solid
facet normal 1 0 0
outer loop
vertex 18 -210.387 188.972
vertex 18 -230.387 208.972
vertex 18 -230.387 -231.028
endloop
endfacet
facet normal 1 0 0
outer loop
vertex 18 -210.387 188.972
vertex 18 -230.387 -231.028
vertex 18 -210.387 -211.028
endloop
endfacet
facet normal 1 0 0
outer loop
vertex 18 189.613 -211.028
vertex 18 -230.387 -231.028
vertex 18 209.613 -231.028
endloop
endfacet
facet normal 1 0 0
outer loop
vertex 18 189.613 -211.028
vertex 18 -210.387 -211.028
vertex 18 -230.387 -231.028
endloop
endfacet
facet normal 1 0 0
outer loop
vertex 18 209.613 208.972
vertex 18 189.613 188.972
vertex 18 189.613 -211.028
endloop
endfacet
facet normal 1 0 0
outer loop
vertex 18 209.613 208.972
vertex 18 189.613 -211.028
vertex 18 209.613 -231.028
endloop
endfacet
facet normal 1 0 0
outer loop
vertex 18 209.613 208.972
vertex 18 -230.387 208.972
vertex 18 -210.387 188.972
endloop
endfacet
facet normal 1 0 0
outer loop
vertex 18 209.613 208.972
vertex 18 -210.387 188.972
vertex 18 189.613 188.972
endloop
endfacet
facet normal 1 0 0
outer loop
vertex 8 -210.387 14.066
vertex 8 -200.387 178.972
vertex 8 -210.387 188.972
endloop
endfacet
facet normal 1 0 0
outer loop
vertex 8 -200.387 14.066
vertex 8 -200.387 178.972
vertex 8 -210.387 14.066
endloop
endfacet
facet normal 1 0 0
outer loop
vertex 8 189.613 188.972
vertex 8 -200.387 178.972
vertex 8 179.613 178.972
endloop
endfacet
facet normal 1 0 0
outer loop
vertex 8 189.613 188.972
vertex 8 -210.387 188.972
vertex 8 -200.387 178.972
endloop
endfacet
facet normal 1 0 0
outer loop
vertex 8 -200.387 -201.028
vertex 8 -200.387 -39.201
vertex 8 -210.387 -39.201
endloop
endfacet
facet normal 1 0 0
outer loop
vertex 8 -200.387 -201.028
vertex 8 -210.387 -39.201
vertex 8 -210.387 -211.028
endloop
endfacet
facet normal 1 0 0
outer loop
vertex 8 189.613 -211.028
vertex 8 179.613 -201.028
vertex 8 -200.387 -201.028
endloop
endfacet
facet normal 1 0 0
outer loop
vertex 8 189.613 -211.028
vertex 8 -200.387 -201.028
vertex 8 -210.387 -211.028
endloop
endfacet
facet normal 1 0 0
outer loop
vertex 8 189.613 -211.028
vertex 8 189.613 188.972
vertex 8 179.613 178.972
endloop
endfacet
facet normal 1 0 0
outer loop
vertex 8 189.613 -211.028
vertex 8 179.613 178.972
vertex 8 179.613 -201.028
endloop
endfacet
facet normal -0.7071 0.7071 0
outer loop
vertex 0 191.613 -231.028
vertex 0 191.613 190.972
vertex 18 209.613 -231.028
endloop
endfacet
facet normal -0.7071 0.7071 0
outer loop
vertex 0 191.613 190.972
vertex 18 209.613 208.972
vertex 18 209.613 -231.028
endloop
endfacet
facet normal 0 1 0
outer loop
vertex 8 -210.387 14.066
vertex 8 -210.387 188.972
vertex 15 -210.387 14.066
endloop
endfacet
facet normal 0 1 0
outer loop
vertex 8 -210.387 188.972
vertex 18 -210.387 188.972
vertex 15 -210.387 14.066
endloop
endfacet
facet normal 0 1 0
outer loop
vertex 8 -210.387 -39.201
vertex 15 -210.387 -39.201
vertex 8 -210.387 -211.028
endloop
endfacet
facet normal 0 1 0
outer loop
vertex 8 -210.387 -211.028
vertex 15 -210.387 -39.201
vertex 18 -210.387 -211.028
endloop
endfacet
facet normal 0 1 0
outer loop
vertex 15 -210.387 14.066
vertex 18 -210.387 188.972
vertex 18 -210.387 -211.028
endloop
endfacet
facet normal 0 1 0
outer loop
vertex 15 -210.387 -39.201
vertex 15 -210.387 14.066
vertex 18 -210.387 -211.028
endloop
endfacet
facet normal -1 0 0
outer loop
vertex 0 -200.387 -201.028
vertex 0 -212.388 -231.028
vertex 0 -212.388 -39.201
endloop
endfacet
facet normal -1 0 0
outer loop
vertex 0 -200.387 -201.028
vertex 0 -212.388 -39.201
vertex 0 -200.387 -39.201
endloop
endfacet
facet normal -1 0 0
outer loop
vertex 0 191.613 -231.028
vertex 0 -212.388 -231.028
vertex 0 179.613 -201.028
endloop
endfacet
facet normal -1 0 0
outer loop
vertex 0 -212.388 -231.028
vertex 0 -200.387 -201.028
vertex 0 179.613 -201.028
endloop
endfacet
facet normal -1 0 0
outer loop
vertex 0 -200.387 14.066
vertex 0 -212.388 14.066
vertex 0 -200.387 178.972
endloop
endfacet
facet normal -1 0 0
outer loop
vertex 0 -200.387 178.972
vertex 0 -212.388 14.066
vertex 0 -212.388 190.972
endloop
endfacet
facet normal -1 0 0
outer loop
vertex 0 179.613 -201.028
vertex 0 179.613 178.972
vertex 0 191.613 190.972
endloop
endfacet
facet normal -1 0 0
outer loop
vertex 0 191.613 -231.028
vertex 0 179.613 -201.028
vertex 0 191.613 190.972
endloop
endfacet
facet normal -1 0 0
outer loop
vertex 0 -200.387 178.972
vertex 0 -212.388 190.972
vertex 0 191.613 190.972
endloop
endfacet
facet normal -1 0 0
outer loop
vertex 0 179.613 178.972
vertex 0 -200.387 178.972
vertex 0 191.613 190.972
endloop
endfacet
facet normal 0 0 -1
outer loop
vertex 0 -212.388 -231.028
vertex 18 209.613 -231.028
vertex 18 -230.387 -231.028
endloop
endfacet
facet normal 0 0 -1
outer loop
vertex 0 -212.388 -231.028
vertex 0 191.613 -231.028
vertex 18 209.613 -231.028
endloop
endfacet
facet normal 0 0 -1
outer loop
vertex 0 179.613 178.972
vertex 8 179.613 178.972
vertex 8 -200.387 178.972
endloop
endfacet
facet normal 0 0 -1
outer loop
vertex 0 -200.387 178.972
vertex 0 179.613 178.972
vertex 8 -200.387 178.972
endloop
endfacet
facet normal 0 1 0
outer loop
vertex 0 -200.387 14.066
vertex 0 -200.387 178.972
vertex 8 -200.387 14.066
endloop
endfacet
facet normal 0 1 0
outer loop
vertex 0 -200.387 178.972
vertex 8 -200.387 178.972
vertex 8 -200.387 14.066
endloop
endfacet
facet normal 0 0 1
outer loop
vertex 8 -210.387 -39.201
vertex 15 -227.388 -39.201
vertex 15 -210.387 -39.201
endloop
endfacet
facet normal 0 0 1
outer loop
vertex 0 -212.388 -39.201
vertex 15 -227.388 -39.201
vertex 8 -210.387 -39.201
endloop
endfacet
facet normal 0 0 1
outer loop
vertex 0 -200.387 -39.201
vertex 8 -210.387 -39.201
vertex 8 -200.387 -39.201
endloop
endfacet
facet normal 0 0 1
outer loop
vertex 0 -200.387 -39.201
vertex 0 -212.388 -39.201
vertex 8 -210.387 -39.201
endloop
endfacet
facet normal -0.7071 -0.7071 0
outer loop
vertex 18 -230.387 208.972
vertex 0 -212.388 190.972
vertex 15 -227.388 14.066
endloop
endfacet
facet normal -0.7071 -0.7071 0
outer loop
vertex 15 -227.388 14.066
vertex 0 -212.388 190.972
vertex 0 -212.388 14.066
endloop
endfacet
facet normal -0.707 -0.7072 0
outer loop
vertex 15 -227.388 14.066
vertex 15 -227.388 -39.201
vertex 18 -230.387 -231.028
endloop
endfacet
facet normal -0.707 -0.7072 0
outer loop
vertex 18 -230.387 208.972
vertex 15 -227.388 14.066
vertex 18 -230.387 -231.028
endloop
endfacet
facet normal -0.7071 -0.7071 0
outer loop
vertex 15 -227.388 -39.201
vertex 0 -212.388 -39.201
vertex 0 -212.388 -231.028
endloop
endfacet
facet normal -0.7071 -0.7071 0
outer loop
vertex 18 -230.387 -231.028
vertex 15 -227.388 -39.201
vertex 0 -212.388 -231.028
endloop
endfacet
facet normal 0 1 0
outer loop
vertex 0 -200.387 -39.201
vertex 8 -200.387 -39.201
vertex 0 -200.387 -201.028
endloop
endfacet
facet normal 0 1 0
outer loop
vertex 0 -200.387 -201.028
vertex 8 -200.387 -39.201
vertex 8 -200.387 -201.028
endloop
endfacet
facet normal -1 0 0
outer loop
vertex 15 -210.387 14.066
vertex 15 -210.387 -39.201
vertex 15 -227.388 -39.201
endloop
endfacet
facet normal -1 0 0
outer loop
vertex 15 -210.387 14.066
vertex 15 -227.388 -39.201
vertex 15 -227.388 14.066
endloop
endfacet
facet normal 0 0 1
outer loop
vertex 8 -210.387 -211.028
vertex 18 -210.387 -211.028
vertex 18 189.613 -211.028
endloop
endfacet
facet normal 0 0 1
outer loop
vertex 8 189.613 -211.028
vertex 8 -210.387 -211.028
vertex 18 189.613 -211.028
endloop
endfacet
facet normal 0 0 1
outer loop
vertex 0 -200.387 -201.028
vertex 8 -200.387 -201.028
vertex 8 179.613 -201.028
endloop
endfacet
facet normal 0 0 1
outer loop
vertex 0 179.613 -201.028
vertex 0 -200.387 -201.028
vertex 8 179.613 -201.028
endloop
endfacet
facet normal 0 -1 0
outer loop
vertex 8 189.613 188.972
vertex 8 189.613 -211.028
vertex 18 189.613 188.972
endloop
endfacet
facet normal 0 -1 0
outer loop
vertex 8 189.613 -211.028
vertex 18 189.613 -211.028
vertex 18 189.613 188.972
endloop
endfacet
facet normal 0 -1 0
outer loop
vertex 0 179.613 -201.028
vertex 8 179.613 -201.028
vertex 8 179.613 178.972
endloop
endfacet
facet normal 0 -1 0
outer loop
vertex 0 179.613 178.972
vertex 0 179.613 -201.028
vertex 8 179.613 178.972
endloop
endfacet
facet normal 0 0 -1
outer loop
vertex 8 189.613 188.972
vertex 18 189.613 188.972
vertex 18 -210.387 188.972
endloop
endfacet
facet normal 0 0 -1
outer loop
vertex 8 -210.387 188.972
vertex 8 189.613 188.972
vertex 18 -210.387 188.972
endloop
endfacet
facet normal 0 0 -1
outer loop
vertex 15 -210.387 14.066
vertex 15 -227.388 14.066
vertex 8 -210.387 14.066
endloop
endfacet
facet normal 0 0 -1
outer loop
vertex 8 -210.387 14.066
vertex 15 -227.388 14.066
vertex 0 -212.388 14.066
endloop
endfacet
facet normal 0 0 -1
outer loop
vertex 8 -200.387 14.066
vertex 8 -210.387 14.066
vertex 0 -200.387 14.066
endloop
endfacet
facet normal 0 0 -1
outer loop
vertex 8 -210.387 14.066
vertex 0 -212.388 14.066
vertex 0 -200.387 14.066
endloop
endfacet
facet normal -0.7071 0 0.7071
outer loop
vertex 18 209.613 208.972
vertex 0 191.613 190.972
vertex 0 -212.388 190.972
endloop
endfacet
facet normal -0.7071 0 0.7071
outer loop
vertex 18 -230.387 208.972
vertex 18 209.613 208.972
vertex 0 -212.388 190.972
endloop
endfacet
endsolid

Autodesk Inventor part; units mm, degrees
ref_plane "YZ Plane" through (0, 0, 0) normal (1, 0, 0) x (0, 1, 0)
ref_plane "XZ Plane" through (0, 0, 0) normal (0, 1, 0) x (-1, 0, 0)
ref_plane "XY Plane" through (0, 0, 0) normal (0, 0, 1) x (1, 0, 0)
sketch "Skizze1" plane through (0, 0, 0) normal (1, 0, 0) x (0, 1, 0)
  line L0 (-230.3873, 208.9718) -> (209.6127, 208.9718)
  line L1 (209.6127, 208.9718) -> (209.6127, -231.0282)
  line L2 (209.6127, -231.0282) -> (-230.3873, -231.0282)
  line L3 (-230.3873, -231.0282) -> (-230.3873, 208.9718)
  point P0 (0, 0)
  dimension "d0" = 440
  dimension "d1" = 440
extrude "Extrusion1" add sketch "Skizze1" along normal blind 18
sketch "Skizze2" plane through (18, 0, 0) normal (1, 0, 0) x (0, 0, -1)
  line L0 (-208.9718, 209.6127) -> (-208.9718, -230.3873) projected
  line L1 (-208.9718, -230.3873) -> (231.0282, -230.3873) projected
  line L2 (231.0282, -230.3873) -> (231.0282, 209.6127) projected
  line L3 (231.0282, 209.6127) -> (-208.9718, 209.6127) projected
  line L4 (-188.9718, -210.3873) -> (211.0282, -210.3873)
  line L5 (211.0282, -210.3873) -> (211.0282, 189.6127)
  line L6 (211.0282, 189.6127) -> (-188.9718, 189.6127)
  line L7 (-188.9718, 189.6127) -> (-188.9718, -210.3873)
  point P0 (0, 0)
  dimension "d4" = 20
  dimension "d5" = 20
  dimension "d6" = 20
  dimension "d7" = 20
extrude "Extrusion2" cut sketch "Skizze2" against normal blind 10 contours L7 L6 L5 L4
sketch "Skizze3" plane through (8, 0, 0) normal (1, 0, 0) x (0, 0, -1)
  line L0 (211.0282, -210.3873) -> (-188.9718, -210.3873) projected
  line L1 (211.0282, 189.6127) -> (211.0282, -210.3873) projected
  line L2 (-188.9718, 189.6127) -> (211.0282, 189.6127) projected
  line L3 (-188.9718, -210.3873) -> (-188.9718, 189.6127) projected
  line L4 (-178.9718, -200.3873) -> (201.0282, -200.3873)
  line L5 (201.0282, -200.3873) -> (201.0282, 179.6127)
  line L6 (201.0282, 179.6127) -> (-178.9718, 179.6127)
  line L7 (-178.9718, 179.6127) -> (-178.9718, -200.3873)
  point P0 (0, 0)
  dimension "d10" = 10
  dimension "d11" = 10
  dimension "d12" = 10
  dimension "d13" = 10
extrude "Extrusion3" cut sketch "Skizze3" against normal blind 8 contours L7 L6 L5 L4
sketch "Skizze6" plane through (0, 0, 0) normal (-1, 0, 0) x (0, 0, 1)
  line L0 (-201.0282, -200.3873) -> (-201.0282, 179.6127) projected
  line L1 (-201.0282, 179.6127) -> (178.9718, 179.6127) projected
  line L2 (178.9718, 179.6127) -> (178.9718, -200.3873) projected
  line L3 (178.9718, -200.3873) -> (-201.0282, -200.3873) projected
  line L4 (208.9718, -230.3873) -> (208.9718, 209.6127) projected
  line L5 (208.9718, 209.6127) -> (-231.0282, 209.6127) projected
  line L6 (-231.0282, 209.6127) -> (-231.0282, -230.3873) projected
  line L7 (-231.0282, -230.3873) -> (208.9718, -230.3873) projected
  line L8 (6.4718, -214.3873) -> (6.4718, -223.3873) projected
  line L9 (10.9718, -214.3873) -> (6.4718, -214.3873) projected
  line L10 (6.4718, -223.3873) -> (1.9718, -223.3873) projected
  line L11 (1.9718, -210.3873) -> (1.9718, -223.3873) projected
  line L12 (10.9718, -210.3873) -> (10.9718, -214.3873) projected
  line L13 (-211.0282, -210.3873) -> (188.9718, -210.3873) projected
  line L14 (-0.0282, -210.3873) -> (-0.0282, -223.3873) projected
  line L15 (-9.0282, -210.3873) -> (-9.0282, -214.3873) projected
  line L16 (-4.5282, -214.3873) -> (-9.0282, -214.3873) projected
  line L17 (-4.5282, -214.3873) -> (-4.5282, -223.3873) projected
  line L18 (-0.0282, -223.3873) -> (-4.5282, -223.3873) projected
  line L19 (-16.0282, -210.3873) -> (-16.0282, -214.3873) projected
  line L20 (-16.0282, -214.3873) -> (-20.5282, -214.3873) projected
  line L21 (-20.5282, -214.3873) -> (-20.5282, -223.3873) projected
  line L22 (-20.5282, -223.3873) -> (-25.0282, -223.3873) projected
  line L23 (-25.0282, -210.3873) -> (-25.0282, -223.3873) projected
  line L24 (-27.0282, -210.3873) -> (-27.0282, -223.3873) projected
  line L25 (-27.0282, -223.3873) -> (-31.5282, -223.3873) projected
  line L26 (-31.5282, -214.3873) -> (-31.5282, -223.3873) projected
  line L27 (-31.5282, -214.3873) -> (-36.0282, -214.3873) projected
  line L28 (-36.0282, -210.3873) -> (-36.0282, -214.3873) projected
  line L29 (-231.0282, -230.3873) -> (208.9718, -230.3873) projected
  line L30 (14.0665, -230.3873) -> (14.0665, -200.3873)
  line L31 (-39.201, -230.3873) -> (-39.201, -200.3873)
  point P0 (0, 0)
extrude "Extrusion4" cut sketch "Skizze6" against normal blind 15 contours L3 L30 L13 L31 | L13 L28 L27 L26 L25 L24 L23 L22 L21 L20 L19 L15 L16 L17 L18 L14 L11 L10 L8 L9 L12 L30 L7 L31 | L13 L24 L25 L26 L27 L28 | L12 L9 L8 L10 L11 L13 | L13 L19 L20 L21 L22 L23 | L14 L18 L17 L16 L15 L13
chamfer "Fase1" distance 18 angle 45 1 edges at (0, -230.3873, 111.5191)
chamfer "Fase2" distance 18 angle 45 2 edges at (0, 209.6127, -11.0282) (0, -1.3876, 208.9718)
properties part number "PV_Rahmen_CPY"
